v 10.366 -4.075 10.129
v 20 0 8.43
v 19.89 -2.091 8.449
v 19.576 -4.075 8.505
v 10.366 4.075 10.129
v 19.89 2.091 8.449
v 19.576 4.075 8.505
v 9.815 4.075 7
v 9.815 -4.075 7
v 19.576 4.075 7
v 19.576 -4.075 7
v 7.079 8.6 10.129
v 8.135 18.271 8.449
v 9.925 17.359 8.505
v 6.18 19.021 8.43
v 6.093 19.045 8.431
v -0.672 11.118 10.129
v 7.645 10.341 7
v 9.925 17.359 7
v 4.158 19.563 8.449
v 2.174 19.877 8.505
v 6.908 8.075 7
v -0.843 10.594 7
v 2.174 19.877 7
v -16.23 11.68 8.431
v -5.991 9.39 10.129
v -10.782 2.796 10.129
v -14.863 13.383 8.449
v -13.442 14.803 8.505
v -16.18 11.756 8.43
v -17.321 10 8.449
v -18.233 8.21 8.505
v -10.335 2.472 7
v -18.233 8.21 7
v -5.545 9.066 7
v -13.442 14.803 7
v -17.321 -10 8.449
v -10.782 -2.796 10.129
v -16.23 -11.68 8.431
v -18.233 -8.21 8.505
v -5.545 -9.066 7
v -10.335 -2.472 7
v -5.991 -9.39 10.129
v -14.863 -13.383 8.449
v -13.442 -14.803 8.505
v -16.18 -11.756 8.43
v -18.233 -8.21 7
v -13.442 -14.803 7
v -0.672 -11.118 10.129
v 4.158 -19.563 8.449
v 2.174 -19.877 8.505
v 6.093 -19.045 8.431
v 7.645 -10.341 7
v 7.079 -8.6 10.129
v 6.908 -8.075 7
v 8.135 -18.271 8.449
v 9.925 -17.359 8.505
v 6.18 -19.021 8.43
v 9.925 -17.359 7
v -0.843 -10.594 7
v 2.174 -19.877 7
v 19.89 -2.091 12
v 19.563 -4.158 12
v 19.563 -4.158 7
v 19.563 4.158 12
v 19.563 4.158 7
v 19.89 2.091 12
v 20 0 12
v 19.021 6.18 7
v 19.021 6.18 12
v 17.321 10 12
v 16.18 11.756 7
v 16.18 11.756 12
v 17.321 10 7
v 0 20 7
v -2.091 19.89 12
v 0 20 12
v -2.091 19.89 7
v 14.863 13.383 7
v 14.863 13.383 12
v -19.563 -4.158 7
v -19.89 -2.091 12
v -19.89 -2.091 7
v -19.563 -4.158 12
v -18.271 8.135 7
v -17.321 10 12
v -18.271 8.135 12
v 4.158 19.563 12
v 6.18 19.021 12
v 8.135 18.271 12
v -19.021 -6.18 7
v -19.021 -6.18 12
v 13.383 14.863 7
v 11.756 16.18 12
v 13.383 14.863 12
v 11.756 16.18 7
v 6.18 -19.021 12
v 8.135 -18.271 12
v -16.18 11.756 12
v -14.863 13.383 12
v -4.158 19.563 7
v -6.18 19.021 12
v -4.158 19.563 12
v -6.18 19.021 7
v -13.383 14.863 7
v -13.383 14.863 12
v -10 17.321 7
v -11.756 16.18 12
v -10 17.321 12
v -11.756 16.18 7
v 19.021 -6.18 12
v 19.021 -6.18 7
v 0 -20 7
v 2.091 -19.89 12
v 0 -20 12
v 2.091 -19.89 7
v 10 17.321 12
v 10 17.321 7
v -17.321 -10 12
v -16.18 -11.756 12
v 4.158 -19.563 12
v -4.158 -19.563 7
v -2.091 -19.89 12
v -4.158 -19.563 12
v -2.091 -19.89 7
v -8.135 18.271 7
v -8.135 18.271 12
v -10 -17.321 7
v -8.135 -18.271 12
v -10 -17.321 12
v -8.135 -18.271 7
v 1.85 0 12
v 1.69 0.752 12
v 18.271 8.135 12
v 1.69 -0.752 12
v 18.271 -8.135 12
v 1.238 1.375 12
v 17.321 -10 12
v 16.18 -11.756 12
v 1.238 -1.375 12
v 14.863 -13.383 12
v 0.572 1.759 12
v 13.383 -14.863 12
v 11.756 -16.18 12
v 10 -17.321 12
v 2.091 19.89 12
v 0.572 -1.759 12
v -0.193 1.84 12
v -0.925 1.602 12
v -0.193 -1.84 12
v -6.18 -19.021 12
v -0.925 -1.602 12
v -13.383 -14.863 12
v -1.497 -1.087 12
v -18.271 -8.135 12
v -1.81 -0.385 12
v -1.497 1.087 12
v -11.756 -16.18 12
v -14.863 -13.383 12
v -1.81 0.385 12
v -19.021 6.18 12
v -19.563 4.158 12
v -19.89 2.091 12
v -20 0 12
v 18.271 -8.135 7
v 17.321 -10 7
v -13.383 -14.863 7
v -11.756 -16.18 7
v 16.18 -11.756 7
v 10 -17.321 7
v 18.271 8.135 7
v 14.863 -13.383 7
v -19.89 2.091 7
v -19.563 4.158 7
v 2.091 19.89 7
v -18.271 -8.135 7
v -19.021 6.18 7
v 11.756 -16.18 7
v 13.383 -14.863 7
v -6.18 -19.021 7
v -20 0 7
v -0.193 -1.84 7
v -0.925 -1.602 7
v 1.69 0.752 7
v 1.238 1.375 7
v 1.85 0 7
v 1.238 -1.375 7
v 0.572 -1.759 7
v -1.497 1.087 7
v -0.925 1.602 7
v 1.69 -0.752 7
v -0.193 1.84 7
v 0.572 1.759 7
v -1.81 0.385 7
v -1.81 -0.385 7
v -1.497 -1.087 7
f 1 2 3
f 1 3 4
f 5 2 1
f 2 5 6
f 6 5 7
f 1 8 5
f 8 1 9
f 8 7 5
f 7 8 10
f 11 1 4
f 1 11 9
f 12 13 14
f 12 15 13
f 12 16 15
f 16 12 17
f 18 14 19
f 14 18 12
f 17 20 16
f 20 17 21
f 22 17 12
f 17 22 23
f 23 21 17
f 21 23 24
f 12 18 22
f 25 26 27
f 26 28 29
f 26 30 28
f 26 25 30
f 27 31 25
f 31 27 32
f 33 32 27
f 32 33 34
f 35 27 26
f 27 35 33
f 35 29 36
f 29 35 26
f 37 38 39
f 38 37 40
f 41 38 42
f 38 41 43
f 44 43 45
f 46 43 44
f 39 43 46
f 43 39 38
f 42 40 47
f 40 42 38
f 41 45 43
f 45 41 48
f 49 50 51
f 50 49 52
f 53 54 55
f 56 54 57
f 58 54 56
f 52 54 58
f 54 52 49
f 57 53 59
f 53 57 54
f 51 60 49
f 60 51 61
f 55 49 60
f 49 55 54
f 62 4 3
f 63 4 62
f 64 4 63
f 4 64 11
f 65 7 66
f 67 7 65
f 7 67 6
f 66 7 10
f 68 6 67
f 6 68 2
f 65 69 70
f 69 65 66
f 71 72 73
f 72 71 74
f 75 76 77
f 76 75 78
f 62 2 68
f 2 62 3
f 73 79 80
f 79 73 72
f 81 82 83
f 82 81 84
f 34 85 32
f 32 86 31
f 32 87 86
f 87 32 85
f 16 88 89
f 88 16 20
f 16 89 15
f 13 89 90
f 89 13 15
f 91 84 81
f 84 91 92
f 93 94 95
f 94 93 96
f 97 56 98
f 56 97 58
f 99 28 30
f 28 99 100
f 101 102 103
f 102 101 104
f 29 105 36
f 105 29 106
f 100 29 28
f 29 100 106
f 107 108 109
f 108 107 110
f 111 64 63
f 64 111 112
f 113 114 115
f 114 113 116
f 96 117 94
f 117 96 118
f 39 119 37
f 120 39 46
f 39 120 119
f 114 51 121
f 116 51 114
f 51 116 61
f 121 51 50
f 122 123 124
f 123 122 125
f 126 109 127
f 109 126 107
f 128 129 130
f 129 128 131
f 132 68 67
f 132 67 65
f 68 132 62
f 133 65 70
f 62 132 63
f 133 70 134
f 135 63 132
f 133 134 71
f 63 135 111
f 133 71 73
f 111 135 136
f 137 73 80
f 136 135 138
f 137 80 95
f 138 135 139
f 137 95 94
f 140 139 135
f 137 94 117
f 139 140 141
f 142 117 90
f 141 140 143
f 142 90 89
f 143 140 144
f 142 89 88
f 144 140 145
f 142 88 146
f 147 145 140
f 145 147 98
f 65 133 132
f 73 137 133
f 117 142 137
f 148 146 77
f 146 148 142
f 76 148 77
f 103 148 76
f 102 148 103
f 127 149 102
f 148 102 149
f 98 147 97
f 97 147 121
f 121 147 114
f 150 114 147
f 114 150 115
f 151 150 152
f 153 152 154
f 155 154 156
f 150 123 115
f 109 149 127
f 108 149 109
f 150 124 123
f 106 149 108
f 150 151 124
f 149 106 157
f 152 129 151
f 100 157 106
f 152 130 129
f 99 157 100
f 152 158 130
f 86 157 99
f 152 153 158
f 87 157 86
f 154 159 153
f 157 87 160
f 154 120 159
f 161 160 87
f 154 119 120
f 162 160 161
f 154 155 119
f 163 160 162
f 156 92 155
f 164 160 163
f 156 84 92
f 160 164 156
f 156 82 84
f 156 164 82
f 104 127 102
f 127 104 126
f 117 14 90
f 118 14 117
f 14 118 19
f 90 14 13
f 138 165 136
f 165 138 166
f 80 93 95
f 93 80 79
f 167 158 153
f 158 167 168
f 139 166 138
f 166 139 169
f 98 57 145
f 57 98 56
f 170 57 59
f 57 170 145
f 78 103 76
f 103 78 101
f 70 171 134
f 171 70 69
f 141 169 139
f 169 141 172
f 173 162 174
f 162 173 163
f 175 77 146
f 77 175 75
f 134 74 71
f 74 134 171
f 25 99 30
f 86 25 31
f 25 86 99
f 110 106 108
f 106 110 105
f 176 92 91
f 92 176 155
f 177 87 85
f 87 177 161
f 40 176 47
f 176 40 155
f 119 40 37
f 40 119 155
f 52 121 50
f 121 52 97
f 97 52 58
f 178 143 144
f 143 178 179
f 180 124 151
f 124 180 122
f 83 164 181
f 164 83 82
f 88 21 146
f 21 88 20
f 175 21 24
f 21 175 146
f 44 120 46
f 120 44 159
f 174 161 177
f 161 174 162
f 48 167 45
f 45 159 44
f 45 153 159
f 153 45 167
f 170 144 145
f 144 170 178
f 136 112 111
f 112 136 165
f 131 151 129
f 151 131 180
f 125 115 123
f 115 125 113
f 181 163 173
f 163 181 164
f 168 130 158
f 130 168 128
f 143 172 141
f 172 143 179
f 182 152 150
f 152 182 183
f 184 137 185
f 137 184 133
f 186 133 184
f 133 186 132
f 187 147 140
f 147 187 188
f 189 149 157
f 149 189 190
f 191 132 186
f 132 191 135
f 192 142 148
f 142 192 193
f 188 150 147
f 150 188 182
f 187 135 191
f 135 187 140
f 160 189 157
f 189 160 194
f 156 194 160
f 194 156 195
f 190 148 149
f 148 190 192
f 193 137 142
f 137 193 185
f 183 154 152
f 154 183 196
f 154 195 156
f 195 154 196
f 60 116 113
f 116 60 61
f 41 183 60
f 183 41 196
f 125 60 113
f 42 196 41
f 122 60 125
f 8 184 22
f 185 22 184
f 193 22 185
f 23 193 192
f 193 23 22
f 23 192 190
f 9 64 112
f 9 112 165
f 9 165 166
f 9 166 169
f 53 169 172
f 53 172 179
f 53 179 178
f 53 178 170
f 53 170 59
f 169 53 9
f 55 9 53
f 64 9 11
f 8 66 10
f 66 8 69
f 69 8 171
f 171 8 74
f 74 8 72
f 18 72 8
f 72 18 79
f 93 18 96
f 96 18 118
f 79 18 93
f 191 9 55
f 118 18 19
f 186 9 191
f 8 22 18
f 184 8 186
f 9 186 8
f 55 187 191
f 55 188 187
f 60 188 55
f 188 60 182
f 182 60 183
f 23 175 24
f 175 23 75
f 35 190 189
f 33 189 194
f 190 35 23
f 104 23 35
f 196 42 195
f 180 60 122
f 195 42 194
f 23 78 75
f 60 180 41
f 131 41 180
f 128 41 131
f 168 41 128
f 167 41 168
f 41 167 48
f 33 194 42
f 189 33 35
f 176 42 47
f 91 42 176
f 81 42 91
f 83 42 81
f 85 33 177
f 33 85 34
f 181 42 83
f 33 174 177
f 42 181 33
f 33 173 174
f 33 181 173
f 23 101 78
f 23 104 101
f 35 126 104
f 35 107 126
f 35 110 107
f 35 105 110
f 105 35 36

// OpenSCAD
angle=10;
offset=-2;

//difference(){
//translate([0,0,offset])
//cylinder(d=40,h=30,$fn=60,center=true);
//cylinder(d=3.7,h=60,$fn=15,center=true);
//for(i=[0:72:330]){
//rotate([0,0,i])
//rotate([0,angle,0])translate([18.45,0,0])
//cube([20,8.15,23.55],center=true);
//}
//translate([0,0,-12])cylinder(d=50,h=30);
//}
//difference(){
//translate([0,0,-17])cylinder(d=10,h=12,$fn=30);
//cylinder(d=2.7,h=100,$fn=12,center=true);
//}

difference(){
translate([0,0,offset])
cylinder(d=40,h=28,$fn=60,center=true);
cylinder(d=3.7,h=60,$fn=15,center=true);
for(i=[0:72:330]){
rotate([0,0,i])
rotate([0,angle,0])translate([18.45,0,0])
cube([20,8.15,23.55],center=true);
}
translate([0,0,-23])cylinder(d=50,h=30);
}

%rotate([0,angle,0])translate([18.45,0,0])
cube([20,8.15,23.55],center=true);
